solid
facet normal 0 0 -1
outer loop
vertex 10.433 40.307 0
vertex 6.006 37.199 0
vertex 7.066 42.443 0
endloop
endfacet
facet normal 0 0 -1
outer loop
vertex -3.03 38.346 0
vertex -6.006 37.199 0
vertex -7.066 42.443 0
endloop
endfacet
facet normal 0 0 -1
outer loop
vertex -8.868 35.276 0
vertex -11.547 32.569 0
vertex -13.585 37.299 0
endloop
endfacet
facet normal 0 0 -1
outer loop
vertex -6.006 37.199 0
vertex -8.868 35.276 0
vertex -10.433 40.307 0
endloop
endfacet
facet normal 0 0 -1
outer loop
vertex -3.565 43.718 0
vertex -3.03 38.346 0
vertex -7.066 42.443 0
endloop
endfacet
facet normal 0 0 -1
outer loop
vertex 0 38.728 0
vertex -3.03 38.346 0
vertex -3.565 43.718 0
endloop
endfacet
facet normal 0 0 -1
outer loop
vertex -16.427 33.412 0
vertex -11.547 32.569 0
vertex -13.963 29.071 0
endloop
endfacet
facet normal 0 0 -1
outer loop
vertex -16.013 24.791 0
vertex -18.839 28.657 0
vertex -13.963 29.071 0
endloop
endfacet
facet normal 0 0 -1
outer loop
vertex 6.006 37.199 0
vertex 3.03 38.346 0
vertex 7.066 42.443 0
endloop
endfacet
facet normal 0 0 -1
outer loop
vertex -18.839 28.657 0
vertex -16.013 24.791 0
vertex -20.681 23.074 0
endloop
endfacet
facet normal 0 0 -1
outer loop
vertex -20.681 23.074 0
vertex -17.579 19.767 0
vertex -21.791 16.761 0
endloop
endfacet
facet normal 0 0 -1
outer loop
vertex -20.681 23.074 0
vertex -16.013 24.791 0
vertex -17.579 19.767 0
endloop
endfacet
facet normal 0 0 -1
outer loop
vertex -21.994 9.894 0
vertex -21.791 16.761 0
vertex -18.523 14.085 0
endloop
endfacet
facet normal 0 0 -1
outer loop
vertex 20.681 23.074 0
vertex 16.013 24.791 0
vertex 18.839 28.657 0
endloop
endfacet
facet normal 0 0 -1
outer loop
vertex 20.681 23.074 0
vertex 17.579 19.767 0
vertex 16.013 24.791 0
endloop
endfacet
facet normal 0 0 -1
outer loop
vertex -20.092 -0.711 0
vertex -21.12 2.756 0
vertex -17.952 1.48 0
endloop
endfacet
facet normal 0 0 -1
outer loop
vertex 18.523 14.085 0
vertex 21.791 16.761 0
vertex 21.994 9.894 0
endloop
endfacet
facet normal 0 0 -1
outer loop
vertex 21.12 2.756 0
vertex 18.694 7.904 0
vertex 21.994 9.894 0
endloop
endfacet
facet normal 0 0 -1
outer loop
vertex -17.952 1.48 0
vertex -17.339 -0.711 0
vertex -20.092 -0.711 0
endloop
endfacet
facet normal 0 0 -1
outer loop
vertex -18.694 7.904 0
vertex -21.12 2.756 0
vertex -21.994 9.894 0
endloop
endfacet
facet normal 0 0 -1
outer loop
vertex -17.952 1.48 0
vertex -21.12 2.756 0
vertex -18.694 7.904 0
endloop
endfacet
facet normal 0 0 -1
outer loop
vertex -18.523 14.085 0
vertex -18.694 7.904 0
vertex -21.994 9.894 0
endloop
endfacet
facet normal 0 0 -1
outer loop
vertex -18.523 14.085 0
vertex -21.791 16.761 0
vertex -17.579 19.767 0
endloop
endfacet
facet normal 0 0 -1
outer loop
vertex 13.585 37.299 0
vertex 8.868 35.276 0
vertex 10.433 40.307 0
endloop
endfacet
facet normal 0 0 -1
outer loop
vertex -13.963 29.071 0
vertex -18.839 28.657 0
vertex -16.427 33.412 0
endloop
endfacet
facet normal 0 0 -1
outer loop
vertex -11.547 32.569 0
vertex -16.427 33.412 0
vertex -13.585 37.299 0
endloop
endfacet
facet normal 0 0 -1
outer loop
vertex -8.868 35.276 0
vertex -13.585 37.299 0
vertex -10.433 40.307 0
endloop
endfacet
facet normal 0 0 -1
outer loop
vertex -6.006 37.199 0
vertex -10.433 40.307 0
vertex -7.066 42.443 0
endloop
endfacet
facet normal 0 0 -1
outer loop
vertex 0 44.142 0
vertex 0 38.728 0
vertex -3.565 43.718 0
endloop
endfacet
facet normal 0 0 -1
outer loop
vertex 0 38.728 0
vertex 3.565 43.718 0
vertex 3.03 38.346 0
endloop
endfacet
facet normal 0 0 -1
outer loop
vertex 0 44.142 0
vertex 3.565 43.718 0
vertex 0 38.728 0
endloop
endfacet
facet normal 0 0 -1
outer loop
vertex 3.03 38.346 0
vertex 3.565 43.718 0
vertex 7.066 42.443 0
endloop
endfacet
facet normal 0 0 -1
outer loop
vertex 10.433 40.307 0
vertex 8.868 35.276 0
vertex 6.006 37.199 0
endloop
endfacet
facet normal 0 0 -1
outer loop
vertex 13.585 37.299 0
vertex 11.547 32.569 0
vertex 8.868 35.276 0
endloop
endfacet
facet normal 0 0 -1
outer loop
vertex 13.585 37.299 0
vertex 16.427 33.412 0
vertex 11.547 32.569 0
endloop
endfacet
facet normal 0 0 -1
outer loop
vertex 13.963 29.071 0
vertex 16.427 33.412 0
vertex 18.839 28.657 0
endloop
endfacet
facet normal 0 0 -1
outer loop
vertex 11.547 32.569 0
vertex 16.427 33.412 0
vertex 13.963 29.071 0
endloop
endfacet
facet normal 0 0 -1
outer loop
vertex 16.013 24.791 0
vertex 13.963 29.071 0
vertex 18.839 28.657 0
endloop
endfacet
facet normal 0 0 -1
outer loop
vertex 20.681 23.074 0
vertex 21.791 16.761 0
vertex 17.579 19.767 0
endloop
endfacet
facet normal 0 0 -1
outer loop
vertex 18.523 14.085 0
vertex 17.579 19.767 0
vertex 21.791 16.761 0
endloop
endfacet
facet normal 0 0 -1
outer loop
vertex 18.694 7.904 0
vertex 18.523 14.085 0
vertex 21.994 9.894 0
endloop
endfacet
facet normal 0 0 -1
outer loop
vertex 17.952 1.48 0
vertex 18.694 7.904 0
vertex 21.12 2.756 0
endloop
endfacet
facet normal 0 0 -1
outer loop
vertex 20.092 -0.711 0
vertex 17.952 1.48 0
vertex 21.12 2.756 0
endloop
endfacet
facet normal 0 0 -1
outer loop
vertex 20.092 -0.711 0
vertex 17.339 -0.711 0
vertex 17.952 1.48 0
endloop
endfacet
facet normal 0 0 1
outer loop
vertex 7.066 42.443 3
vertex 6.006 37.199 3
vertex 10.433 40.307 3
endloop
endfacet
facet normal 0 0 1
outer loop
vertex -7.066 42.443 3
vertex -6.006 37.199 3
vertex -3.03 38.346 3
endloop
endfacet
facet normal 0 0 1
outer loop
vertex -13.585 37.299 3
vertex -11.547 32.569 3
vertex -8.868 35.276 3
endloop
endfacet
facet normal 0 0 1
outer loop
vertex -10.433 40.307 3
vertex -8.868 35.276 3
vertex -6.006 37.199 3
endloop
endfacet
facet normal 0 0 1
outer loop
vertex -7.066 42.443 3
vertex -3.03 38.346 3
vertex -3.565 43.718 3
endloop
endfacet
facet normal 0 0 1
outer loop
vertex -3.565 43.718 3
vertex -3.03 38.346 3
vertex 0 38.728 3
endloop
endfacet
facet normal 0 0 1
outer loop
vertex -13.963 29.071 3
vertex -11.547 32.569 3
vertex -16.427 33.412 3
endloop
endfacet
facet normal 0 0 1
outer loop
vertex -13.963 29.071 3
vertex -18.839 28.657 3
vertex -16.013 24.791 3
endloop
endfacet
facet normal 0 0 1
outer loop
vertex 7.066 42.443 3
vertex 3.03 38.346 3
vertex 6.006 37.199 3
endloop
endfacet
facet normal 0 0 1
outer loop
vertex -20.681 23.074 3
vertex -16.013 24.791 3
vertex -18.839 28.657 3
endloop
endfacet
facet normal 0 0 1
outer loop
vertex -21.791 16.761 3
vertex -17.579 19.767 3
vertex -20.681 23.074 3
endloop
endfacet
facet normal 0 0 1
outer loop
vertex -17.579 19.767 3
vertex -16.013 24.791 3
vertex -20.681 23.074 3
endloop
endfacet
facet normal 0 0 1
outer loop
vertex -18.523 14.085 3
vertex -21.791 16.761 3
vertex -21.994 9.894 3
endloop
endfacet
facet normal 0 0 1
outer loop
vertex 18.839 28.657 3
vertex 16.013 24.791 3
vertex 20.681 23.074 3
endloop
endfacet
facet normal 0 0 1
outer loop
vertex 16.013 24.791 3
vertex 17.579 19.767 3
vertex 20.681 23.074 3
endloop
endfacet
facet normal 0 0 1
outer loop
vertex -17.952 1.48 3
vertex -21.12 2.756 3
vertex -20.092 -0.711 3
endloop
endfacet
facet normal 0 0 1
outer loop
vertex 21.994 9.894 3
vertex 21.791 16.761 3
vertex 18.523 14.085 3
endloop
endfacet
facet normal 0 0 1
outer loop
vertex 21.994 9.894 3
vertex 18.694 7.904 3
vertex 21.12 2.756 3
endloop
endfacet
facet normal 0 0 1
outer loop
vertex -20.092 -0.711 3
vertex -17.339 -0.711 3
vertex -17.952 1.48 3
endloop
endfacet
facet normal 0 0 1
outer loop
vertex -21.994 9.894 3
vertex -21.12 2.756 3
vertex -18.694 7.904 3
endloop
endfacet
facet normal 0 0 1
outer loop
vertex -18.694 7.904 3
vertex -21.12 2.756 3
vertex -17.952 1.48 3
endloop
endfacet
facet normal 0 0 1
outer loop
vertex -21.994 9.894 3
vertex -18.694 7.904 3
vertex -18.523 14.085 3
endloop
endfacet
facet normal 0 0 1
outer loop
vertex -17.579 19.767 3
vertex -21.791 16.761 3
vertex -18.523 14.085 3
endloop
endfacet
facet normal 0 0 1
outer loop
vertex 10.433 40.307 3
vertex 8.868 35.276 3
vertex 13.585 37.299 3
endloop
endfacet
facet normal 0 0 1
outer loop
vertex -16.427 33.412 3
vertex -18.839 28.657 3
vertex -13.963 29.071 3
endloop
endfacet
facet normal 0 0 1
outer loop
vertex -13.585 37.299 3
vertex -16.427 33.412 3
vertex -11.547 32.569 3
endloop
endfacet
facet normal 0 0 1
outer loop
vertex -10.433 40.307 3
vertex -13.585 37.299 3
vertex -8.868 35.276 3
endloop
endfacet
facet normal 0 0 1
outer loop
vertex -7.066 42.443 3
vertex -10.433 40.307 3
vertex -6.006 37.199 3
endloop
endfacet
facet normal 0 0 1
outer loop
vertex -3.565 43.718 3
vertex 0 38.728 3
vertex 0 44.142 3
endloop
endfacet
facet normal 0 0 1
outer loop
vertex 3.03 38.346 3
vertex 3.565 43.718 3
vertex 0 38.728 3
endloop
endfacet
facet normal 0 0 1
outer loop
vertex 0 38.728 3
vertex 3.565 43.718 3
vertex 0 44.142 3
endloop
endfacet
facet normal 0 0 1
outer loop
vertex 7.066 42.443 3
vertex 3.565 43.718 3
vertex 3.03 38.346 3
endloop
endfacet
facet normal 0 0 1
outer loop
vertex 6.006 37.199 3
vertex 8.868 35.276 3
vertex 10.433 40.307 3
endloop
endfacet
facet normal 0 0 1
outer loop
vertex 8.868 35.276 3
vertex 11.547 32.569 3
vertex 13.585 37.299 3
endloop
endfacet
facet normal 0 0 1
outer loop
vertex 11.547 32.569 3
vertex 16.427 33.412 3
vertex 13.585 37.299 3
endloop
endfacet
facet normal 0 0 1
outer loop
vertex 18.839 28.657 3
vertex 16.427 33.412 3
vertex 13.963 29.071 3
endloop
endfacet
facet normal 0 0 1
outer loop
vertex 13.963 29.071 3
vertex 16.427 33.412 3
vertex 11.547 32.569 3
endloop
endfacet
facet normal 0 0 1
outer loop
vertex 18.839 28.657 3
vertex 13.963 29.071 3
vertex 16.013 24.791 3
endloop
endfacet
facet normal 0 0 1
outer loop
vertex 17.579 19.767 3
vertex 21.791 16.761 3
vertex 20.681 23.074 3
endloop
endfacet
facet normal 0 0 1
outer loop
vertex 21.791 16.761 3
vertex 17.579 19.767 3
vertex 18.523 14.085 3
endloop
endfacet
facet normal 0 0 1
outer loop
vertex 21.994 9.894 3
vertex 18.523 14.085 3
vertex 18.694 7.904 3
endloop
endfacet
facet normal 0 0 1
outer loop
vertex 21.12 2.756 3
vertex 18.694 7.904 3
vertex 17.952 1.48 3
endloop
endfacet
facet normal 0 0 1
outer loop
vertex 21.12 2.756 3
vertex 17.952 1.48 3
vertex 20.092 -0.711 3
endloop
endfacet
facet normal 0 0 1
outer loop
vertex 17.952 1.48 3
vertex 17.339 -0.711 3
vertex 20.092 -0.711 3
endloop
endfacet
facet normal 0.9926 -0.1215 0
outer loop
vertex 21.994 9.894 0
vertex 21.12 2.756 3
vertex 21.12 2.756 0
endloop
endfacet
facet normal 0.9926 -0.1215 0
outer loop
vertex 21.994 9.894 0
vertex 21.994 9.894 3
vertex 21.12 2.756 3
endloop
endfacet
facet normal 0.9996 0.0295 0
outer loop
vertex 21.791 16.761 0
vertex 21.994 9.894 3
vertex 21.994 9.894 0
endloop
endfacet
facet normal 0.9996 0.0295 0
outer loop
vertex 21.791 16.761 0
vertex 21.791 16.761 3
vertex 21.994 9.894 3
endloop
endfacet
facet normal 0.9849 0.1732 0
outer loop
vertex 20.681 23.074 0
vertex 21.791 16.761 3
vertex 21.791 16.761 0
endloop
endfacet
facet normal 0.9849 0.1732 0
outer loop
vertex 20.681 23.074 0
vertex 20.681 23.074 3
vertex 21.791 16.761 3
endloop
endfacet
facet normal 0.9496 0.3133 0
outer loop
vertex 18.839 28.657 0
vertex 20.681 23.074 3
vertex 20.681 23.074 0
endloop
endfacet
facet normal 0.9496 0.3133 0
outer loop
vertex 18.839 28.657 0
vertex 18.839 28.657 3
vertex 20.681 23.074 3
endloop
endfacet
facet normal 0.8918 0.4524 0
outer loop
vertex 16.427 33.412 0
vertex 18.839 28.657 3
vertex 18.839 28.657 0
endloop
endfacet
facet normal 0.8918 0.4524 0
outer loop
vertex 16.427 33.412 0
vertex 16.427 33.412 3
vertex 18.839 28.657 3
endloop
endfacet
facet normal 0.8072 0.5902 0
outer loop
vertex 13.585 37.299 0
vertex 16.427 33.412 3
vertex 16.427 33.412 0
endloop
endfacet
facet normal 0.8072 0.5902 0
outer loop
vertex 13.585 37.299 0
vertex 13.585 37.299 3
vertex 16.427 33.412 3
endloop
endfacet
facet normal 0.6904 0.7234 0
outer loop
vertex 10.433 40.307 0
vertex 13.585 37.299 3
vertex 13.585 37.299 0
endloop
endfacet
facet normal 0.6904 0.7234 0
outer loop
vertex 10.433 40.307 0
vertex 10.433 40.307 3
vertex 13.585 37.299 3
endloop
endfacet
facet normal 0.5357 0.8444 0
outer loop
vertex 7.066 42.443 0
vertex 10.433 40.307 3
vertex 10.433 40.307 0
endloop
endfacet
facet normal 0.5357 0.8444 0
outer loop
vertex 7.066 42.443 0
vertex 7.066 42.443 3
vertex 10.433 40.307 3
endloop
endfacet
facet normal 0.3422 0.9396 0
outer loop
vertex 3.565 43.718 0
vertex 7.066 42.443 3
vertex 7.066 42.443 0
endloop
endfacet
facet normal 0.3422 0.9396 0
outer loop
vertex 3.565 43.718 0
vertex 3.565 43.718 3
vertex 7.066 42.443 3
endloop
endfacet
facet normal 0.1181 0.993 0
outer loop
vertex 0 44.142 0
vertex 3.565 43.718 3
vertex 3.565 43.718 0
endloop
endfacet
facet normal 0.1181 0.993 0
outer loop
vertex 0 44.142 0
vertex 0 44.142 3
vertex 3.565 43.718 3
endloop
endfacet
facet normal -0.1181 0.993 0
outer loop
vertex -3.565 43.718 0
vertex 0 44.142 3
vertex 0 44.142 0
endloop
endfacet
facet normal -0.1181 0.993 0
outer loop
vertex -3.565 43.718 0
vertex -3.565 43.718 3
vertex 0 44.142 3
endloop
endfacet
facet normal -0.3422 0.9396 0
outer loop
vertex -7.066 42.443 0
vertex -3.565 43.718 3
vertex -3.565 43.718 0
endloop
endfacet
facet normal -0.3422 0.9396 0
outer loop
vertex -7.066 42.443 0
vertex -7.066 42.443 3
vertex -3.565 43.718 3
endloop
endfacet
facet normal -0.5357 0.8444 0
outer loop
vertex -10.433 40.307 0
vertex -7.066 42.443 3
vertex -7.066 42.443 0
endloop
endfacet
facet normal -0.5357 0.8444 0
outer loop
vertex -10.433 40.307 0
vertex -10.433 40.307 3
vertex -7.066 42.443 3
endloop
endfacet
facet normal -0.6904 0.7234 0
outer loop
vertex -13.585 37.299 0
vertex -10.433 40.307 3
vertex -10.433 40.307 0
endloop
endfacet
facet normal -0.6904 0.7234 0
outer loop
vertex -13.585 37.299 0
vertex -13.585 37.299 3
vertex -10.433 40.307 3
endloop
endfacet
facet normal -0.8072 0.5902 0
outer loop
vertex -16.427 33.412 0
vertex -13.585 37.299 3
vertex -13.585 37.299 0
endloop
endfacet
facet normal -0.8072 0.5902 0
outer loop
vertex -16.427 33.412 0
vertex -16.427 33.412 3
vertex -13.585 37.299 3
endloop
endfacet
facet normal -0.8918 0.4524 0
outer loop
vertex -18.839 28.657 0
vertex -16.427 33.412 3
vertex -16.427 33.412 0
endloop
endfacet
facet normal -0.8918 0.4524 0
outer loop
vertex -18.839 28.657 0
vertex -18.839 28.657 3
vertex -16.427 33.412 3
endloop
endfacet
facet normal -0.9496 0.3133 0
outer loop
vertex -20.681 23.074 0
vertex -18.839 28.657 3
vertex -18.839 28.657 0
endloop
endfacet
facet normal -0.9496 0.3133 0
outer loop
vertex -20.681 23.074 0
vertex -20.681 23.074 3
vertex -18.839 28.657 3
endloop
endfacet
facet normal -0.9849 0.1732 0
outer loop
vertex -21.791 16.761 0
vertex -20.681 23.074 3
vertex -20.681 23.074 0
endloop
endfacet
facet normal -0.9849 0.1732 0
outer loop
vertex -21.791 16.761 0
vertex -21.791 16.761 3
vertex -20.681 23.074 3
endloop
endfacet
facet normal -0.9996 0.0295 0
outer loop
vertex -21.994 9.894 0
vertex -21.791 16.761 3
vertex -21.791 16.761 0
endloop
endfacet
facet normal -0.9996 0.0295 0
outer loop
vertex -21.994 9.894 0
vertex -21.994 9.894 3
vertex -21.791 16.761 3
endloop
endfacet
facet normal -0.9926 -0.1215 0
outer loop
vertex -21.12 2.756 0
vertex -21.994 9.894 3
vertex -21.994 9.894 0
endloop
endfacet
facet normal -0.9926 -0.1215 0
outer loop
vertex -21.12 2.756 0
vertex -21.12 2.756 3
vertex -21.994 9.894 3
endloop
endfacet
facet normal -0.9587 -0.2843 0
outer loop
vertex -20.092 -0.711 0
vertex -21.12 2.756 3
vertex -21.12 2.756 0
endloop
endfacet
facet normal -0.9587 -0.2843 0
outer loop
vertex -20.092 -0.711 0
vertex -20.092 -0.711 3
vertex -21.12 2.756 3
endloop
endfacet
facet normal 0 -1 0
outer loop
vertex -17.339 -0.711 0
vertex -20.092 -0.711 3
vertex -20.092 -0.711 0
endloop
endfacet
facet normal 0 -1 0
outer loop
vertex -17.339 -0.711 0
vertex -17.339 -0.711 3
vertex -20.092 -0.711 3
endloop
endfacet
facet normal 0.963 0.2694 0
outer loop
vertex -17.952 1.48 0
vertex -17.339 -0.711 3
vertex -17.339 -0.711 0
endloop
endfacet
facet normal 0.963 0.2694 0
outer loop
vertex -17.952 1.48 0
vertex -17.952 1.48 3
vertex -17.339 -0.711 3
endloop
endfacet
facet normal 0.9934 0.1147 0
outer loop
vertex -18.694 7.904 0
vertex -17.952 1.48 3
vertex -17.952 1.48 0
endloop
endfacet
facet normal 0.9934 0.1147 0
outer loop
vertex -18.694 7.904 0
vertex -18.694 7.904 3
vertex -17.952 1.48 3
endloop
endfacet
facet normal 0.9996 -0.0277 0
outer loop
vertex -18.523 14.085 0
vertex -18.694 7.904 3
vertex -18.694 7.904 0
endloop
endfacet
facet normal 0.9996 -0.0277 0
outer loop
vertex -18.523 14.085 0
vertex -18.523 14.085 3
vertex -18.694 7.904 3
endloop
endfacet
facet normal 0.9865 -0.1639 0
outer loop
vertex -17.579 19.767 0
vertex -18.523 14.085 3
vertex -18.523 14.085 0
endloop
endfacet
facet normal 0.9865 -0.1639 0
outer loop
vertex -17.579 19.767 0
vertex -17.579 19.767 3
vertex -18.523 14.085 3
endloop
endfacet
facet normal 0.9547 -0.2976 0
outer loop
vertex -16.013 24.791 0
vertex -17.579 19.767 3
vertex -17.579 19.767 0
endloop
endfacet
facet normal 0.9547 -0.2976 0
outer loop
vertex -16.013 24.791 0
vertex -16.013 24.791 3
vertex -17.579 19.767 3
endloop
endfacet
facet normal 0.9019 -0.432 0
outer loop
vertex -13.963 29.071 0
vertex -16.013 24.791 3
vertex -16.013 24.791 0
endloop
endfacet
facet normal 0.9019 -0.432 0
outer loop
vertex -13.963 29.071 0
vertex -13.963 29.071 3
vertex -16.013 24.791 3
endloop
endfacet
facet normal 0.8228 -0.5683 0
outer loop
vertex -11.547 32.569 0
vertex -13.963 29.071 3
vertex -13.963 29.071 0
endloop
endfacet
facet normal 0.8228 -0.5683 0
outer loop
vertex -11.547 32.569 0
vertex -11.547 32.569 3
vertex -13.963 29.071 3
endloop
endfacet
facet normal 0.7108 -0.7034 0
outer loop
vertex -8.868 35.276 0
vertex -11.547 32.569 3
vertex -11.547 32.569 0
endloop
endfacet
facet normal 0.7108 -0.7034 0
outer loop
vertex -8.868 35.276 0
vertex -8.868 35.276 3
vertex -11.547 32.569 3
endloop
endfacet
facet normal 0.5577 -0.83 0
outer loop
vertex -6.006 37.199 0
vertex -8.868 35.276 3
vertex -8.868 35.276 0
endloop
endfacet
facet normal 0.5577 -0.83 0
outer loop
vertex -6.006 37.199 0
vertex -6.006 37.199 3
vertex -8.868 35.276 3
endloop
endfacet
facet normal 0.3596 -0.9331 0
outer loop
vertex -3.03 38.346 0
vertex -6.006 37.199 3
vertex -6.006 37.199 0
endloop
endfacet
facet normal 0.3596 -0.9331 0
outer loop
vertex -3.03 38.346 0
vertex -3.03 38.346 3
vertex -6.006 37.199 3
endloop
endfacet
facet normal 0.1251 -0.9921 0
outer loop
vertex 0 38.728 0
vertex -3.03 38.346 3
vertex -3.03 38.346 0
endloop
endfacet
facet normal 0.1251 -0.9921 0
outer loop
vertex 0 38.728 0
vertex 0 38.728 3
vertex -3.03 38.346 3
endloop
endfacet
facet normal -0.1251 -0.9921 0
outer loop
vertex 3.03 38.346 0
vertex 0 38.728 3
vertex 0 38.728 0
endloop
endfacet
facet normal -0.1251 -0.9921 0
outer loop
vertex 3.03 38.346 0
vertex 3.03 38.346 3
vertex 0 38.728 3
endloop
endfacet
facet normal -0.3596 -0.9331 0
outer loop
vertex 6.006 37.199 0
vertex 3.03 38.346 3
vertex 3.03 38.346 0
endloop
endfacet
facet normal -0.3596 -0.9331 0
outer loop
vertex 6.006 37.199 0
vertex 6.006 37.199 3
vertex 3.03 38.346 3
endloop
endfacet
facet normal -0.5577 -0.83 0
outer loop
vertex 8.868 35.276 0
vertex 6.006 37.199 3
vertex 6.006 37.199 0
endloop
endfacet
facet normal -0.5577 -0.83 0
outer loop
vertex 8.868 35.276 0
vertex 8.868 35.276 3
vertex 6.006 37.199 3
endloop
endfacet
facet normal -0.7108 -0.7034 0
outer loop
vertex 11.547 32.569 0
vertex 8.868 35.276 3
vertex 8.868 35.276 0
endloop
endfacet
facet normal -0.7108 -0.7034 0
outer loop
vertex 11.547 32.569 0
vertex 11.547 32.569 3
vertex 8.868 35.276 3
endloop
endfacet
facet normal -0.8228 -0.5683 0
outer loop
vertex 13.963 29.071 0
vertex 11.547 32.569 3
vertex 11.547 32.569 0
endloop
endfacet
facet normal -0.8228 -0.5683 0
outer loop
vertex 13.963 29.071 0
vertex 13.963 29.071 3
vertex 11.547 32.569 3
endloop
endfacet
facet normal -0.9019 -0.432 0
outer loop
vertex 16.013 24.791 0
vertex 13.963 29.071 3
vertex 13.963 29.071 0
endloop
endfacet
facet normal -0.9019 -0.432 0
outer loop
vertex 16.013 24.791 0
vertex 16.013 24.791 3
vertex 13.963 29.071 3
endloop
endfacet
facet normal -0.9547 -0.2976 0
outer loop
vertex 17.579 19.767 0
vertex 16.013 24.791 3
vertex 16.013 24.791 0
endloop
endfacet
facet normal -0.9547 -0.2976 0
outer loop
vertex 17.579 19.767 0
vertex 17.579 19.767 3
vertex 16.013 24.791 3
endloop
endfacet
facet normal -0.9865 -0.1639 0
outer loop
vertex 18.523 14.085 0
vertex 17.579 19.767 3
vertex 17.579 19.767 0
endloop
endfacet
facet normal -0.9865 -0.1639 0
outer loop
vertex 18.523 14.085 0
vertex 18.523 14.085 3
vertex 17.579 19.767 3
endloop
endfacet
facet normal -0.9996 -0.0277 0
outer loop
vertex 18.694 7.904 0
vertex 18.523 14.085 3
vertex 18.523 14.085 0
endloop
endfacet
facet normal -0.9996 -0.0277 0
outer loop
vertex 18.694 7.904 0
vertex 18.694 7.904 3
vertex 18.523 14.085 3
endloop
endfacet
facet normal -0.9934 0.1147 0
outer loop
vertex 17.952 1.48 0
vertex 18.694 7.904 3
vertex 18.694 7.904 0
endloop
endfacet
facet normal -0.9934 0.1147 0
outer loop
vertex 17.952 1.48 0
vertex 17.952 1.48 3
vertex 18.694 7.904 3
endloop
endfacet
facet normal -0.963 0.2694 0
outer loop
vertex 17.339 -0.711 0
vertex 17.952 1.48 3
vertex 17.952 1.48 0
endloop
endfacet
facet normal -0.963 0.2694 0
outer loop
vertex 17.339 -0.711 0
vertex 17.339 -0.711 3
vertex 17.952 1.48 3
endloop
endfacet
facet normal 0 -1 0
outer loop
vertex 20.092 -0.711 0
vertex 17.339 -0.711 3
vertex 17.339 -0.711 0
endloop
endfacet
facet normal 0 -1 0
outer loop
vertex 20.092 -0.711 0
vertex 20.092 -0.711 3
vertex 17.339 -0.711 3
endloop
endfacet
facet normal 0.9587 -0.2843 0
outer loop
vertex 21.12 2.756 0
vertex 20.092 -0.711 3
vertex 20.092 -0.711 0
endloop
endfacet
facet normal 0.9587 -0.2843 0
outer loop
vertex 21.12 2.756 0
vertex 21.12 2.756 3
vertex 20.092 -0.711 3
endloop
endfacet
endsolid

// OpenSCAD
horseshoe();

module horseshoe()
{
    linear_extrude(height=3)
    difference() 
    { 
        horseshoeProjection();
        
        translate ([0, -1, 0])
        scale ([0.85, .9, 1]) 
        horseshoeProjection();
    }
}

module horseshoeProjection()
{
	rotate ([0, 0, 90])
	translate ([45, 0, 0]) 
	projection(cut=true) // the projection is from http://blog.bangsplatpresents.com/?p=1123
	{
		translate( v=[0,0,25] ) 
		{
			rotate( a=[0,45,0] ) 
			{
				cylinder( r1=25, r2=0, h=100, center=true );
			}
		}
	}
}
